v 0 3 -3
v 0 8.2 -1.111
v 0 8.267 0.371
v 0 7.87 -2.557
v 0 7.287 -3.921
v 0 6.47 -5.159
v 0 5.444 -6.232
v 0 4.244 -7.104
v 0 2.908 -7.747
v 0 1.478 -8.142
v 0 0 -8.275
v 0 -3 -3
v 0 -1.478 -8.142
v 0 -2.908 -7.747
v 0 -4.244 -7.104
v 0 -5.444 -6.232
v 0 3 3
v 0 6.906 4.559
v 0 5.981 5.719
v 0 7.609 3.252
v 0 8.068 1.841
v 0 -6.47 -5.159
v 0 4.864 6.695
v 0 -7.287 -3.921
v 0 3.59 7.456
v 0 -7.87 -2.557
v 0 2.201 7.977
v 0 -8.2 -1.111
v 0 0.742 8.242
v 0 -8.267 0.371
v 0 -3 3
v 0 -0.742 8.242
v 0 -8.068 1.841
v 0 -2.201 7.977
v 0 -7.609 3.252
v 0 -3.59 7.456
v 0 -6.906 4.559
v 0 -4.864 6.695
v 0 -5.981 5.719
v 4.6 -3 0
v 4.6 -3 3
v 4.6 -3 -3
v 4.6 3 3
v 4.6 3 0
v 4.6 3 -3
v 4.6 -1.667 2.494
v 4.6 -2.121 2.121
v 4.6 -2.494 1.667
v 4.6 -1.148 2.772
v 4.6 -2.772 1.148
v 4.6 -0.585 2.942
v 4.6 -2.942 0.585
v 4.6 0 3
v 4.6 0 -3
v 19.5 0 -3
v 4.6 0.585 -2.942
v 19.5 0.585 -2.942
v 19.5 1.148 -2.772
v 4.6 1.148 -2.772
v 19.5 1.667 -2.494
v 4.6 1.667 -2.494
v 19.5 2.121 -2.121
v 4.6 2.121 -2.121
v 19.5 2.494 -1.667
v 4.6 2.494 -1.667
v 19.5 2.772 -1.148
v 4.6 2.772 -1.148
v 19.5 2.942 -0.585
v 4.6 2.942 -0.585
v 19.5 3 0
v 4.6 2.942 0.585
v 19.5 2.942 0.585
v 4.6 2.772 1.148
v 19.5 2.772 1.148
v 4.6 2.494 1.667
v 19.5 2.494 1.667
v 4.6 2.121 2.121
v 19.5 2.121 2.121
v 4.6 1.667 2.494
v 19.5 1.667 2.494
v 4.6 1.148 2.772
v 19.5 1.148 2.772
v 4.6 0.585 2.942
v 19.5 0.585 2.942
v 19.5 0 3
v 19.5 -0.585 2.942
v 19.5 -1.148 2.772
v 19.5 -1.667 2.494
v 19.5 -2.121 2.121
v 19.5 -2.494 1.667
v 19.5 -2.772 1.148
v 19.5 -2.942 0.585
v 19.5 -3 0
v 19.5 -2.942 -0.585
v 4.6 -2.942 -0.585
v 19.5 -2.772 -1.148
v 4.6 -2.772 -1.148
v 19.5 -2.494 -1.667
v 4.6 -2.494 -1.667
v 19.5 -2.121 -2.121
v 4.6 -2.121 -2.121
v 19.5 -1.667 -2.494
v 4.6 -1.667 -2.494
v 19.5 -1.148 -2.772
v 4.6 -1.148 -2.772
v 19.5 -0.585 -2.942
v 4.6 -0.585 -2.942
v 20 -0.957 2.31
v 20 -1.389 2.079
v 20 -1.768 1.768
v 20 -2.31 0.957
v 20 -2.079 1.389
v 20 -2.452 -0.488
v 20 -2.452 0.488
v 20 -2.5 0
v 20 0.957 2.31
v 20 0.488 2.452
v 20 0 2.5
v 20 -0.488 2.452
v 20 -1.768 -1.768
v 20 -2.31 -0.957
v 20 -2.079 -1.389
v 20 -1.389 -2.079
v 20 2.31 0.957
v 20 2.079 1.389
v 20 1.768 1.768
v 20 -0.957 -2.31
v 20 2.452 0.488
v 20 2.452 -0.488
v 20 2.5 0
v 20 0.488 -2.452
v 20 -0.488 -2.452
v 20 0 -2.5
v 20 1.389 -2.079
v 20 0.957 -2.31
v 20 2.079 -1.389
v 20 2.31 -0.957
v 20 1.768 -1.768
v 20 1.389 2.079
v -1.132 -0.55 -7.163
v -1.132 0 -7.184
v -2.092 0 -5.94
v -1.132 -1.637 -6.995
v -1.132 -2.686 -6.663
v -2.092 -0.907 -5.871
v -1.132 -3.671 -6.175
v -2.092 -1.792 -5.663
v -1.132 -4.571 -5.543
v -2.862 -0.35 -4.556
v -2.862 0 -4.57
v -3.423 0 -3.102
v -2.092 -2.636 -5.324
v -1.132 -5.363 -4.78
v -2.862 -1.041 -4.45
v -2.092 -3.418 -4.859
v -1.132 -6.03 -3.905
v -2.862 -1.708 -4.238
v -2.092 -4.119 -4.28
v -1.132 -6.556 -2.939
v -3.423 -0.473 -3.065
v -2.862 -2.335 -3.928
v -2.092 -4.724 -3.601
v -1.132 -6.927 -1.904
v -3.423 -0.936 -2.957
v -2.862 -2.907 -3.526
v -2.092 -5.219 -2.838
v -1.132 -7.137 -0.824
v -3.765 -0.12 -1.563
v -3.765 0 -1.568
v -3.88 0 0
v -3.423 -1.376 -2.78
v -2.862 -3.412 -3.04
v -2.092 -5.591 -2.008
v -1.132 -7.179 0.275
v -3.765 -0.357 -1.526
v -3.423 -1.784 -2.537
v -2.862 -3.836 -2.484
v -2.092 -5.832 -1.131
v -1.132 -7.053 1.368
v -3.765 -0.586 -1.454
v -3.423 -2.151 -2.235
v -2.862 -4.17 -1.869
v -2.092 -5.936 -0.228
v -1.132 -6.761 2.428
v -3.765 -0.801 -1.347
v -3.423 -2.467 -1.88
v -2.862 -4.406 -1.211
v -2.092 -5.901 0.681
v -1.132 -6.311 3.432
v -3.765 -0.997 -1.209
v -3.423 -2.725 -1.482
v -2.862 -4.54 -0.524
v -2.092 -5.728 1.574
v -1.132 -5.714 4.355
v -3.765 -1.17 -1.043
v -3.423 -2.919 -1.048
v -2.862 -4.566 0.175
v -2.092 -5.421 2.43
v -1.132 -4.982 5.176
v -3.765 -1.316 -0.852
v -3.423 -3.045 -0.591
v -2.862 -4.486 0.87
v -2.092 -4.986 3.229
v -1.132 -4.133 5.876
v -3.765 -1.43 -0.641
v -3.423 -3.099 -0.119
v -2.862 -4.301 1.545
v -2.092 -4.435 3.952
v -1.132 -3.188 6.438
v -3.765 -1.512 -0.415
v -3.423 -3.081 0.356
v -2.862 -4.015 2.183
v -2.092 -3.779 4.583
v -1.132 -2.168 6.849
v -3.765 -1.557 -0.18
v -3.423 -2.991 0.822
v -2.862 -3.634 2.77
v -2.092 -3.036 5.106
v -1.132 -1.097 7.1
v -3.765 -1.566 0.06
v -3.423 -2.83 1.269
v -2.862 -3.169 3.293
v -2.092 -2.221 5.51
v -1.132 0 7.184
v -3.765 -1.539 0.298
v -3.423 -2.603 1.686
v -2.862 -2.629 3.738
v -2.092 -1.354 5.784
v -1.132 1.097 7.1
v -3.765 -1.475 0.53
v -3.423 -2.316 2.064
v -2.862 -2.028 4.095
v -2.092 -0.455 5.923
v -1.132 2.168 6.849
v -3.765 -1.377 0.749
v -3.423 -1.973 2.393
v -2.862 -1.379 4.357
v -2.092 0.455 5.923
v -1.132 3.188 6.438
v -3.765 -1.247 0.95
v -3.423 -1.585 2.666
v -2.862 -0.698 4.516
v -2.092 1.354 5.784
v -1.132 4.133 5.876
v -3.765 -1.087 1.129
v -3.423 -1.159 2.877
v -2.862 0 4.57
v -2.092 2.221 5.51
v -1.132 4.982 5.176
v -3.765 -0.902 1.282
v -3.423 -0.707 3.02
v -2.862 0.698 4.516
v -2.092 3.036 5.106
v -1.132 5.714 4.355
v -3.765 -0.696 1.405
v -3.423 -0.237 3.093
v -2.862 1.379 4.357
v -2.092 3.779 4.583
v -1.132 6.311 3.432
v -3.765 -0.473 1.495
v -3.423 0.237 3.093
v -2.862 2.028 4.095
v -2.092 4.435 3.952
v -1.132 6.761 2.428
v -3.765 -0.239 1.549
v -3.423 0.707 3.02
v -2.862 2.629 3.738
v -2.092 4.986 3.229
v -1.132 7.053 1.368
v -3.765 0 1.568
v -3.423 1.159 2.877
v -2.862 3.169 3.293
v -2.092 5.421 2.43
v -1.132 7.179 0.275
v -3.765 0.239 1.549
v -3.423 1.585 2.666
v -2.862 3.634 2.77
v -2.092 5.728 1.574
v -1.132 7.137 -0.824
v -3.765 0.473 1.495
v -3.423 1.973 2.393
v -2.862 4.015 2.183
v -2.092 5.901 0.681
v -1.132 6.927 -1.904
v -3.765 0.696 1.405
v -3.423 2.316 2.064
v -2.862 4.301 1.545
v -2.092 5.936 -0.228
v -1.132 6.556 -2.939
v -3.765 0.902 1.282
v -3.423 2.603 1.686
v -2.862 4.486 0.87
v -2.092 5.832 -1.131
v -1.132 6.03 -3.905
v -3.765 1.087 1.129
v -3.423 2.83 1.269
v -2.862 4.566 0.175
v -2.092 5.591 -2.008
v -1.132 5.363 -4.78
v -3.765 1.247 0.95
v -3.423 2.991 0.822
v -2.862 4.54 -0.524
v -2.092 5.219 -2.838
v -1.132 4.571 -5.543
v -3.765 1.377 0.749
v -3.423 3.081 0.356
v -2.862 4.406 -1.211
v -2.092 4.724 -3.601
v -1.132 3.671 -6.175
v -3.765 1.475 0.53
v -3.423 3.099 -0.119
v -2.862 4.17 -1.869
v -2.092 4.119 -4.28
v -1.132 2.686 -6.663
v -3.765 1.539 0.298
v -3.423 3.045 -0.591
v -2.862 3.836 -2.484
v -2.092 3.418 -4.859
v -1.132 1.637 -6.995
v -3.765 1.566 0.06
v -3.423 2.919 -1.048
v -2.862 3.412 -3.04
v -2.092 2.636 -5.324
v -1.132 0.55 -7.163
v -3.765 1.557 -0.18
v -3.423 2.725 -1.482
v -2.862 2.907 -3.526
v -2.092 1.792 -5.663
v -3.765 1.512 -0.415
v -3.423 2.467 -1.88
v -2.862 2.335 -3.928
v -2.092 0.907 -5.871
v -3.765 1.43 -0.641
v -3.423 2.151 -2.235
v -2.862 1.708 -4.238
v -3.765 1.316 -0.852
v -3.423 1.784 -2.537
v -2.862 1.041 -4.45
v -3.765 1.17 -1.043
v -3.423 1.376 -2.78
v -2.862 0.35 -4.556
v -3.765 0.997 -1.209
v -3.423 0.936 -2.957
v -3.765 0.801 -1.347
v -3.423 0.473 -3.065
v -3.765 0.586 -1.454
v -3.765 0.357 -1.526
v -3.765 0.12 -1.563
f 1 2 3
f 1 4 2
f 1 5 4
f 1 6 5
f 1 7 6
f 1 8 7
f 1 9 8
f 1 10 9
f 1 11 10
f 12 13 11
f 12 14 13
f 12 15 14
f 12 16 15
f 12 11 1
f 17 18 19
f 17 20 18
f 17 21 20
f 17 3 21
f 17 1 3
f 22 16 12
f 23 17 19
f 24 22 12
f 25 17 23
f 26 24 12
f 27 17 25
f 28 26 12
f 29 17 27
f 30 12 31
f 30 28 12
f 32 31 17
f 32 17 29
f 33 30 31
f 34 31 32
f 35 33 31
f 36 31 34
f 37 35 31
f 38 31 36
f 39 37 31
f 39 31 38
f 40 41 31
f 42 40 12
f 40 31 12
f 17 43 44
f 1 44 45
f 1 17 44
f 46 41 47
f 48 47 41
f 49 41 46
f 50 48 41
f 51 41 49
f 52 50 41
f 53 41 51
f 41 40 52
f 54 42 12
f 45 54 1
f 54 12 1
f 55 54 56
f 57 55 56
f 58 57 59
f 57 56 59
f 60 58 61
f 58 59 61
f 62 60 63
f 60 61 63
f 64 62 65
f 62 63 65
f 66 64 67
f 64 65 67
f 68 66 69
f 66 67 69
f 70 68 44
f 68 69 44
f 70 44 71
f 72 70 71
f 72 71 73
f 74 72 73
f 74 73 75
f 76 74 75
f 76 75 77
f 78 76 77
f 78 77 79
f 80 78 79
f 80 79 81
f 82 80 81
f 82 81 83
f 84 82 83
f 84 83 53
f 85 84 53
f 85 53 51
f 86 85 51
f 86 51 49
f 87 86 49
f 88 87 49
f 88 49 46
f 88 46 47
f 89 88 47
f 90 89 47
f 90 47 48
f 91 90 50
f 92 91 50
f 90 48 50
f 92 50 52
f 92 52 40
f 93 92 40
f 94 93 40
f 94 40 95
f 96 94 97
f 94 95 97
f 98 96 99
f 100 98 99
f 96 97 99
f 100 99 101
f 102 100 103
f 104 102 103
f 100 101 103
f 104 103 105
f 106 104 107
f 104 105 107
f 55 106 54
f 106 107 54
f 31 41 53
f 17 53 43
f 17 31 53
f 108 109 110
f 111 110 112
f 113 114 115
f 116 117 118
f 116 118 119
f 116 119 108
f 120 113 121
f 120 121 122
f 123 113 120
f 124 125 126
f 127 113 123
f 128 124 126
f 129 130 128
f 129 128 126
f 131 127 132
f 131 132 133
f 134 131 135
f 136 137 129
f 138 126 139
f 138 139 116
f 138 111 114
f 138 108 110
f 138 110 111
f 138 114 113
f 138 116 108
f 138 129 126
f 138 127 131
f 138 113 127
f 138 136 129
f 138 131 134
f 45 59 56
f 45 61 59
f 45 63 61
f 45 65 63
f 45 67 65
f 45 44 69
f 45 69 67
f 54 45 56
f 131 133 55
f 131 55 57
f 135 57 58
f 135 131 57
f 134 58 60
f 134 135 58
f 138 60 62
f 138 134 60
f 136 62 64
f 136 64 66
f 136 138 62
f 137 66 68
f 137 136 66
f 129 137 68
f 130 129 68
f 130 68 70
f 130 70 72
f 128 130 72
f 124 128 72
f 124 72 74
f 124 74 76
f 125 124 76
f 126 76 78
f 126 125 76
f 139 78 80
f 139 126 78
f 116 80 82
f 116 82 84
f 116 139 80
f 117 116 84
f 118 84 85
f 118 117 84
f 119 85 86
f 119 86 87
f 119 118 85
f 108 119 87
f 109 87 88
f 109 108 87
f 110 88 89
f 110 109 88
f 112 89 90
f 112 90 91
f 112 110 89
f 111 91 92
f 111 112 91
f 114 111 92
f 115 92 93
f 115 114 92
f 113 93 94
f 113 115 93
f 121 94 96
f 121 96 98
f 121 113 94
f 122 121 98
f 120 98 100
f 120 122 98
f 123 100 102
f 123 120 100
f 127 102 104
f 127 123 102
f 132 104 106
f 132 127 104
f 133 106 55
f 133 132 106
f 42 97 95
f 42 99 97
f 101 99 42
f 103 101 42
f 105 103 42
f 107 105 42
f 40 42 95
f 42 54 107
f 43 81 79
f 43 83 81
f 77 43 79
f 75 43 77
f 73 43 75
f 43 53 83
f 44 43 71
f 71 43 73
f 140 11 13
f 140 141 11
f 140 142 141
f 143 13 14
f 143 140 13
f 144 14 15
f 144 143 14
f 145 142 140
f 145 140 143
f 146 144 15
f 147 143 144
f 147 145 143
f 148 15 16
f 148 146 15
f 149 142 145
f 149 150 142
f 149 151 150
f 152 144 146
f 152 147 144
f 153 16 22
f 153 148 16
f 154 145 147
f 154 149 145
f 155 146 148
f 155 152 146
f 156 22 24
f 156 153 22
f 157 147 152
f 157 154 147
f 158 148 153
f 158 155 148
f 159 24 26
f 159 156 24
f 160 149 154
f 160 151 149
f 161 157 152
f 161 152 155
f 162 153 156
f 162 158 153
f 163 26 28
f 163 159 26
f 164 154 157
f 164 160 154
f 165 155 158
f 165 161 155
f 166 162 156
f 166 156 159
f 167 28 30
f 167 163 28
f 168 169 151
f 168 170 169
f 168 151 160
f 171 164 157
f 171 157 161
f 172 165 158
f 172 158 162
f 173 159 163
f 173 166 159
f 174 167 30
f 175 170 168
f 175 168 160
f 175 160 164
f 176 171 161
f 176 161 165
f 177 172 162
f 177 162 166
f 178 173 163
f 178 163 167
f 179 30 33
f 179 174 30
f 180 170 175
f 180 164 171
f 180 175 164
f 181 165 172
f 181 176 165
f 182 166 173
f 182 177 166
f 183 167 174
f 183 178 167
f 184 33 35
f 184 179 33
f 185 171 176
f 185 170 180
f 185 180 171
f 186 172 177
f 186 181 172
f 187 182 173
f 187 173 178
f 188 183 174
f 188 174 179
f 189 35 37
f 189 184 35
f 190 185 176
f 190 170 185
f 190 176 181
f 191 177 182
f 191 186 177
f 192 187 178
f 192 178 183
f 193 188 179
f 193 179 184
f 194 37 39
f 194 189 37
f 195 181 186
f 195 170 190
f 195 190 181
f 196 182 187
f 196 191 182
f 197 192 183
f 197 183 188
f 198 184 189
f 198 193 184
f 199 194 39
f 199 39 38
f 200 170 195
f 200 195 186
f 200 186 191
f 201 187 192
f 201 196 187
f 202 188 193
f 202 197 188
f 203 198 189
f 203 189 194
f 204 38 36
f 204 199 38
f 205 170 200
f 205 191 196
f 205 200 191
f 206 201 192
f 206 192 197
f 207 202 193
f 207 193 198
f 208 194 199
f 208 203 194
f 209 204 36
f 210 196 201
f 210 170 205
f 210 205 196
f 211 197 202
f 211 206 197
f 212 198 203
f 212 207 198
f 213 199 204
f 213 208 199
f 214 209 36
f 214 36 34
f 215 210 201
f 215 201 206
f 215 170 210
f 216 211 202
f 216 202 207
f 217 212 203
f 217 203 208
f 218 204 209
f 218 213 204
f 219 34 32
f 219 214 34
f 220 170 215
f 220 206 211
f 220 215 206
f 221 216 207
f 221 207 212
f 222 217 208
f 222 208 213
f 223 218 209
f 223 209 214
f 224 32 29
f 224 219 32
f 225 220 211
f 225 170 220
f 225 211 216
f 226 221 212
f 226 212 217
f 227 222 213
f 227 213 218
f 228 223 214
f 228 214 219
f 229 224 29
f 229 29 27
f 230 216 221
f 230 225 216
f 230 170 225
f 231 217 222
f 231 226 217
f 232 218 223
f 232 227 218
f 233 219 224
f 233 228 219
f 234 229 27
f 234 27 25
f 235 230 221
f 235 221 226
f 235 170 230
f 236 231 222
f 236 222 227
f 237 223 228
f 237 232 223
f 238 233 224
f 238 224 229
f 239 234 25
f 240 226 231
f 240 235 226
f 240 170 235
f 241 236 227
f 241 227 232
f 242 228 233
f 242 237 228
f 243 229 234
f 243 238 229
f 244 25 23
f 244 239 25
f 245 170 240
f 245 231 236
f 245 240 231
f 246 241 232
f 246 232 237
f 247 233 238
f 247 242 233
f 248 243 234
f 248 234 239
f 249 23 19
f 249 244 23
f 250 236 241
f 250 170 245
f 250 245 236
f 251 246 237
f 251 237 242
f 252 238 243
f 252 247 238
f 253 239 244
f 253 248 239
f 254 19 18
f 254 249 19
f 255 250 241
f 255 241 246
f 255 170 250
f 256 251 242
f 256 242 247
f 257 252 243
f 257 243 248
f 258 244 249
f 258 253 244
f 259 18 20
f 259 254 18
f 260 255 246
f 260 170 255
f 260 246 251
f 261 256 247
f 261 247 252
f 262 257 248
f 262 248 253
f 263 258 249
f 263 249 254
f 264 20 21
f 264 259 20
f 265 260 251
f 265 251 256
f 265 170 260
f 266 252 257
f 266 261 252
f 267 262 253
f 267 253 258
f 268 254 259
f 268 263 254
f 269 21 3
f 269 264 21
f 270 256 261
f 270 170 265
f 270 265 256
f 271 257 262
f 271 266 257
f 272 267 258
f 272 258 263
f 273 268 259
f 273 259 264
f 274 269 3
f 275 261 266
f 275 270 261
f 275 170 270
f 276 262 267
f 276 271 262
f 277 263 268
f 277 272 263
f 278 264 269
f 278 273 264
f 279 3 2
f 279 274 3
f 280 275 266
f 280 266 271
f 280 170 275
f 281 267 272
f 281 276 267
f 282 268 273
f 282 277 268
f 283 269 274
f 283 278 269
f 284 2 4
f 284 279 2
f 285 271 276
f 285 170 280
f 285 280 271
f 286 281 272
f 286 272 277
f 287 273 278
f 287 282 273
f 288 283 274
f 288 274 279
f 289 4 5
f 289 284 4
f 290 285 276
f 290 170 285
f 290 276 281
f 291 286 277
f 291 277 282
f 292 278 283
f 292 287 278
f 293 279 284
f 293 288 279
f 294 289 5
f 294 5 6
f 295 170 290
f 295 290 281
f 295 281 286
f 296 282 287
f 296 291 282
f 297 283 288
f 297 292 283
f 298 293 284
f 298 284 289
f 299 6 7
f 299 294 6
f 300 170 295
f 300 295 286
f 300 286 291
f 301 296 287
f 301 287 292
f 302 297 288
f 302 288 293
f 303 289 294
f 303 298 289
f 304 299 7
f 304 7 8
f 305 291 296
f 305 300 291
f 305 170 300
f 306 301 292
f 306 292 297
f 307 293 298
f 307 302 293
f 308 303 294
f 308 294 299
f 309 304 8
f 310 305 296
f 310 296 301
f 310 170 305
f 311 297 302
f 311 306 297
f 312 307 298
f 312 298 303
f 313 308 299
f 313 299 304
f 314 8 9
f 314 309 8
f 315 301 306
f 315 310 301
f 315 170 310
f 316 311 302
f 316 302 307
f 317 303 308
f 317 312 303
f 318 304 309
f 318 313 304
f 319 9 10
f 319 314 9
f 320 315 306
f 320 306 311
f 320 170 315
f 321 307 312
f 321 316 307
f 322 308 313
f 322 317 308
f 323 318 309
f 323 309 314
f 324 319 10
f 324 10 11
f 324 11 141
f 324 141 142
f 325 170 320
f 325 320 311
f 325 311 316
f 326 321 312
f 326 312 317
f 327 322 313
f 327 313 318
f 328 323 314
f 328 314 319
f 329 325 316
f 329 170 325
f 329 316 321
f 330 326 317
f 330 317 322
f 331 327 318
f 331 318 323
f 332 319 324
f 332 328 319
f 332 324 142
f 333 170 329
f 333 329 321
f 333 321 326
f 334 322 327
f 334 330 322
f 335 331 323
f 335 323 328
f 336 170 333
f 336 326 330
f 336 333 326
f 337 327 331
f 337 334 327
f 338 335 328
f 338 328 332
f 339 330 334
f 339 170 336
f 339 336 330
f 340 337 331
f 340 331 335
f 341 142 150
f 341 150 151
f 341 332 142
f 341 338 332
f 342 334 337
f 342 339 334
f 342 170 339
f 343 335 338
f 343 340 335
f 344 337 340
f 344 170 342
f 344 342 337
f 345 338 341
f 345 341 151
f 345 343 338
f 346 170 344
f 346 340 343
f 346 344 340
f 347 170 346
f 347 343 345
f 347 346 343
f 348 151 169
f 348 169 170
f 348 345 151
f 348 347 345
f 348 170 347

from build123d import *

# Parameters (mm, degrees)
SKIZZE2_W               = 6
SKIZZE2_H               = 6
LINEAR_AUSTRAGEN1_DEPTH = 4.6
SKIZZE3_R               = 3
LINEAR_AUSTRAGEN2_DEPTH = 15.4
FASE1_SIZE              = 0.5


with BuildPart() as part:
    # Skizze1 → Rotation1 (revolve)
    with BuildSketch(Plane(origin=(0, 0, 0), x_dir=(1, 0, 0), z_dir=(0, 1, 0))):
        with BuildLine():
            Line((0, 0), (0, 8.275))
            ThreePointArc((0, 8.275), (-2.861847997, 4.569738094), (-3.88, 0))
            Line((-3.88, 0), (0, 0))
        make_face()
    revolve(axis=Axis((0, 0, 0), (-1, 0, 0)))

    # Skizze2 → Linear austragen1 (add)
    with BuildSketch(Plane(origin=(0, 0, 0), x_dir=(0, 0, -1), z_dir=(1, 0, 0))):
        Rectangle(SKIZZE2_W, SKIZZE2_H)
    extrude(amount=LINEAR_AUSTRAGEN1_DEPTH)

    # Skizze3 → Linear austragen2 (add)
    with BuildSketch(Plane(origin=(4.6, 0, 0), x_dir=(0, 0, -1), z_dir=(1, 0, 0))):
        Circle(SKIZZE3_R)
    extrude(amount=LINEAR_AUSTRAGEN2_DEPTH)

    # Fase1
    fase1_edges = [part.edges().sort_by_distance(p)[0] for p in [
        (20, 0, 3),
    ]]
    chamfer(fase1_edges, length=FASE1_SIZE)


solid = part.part
